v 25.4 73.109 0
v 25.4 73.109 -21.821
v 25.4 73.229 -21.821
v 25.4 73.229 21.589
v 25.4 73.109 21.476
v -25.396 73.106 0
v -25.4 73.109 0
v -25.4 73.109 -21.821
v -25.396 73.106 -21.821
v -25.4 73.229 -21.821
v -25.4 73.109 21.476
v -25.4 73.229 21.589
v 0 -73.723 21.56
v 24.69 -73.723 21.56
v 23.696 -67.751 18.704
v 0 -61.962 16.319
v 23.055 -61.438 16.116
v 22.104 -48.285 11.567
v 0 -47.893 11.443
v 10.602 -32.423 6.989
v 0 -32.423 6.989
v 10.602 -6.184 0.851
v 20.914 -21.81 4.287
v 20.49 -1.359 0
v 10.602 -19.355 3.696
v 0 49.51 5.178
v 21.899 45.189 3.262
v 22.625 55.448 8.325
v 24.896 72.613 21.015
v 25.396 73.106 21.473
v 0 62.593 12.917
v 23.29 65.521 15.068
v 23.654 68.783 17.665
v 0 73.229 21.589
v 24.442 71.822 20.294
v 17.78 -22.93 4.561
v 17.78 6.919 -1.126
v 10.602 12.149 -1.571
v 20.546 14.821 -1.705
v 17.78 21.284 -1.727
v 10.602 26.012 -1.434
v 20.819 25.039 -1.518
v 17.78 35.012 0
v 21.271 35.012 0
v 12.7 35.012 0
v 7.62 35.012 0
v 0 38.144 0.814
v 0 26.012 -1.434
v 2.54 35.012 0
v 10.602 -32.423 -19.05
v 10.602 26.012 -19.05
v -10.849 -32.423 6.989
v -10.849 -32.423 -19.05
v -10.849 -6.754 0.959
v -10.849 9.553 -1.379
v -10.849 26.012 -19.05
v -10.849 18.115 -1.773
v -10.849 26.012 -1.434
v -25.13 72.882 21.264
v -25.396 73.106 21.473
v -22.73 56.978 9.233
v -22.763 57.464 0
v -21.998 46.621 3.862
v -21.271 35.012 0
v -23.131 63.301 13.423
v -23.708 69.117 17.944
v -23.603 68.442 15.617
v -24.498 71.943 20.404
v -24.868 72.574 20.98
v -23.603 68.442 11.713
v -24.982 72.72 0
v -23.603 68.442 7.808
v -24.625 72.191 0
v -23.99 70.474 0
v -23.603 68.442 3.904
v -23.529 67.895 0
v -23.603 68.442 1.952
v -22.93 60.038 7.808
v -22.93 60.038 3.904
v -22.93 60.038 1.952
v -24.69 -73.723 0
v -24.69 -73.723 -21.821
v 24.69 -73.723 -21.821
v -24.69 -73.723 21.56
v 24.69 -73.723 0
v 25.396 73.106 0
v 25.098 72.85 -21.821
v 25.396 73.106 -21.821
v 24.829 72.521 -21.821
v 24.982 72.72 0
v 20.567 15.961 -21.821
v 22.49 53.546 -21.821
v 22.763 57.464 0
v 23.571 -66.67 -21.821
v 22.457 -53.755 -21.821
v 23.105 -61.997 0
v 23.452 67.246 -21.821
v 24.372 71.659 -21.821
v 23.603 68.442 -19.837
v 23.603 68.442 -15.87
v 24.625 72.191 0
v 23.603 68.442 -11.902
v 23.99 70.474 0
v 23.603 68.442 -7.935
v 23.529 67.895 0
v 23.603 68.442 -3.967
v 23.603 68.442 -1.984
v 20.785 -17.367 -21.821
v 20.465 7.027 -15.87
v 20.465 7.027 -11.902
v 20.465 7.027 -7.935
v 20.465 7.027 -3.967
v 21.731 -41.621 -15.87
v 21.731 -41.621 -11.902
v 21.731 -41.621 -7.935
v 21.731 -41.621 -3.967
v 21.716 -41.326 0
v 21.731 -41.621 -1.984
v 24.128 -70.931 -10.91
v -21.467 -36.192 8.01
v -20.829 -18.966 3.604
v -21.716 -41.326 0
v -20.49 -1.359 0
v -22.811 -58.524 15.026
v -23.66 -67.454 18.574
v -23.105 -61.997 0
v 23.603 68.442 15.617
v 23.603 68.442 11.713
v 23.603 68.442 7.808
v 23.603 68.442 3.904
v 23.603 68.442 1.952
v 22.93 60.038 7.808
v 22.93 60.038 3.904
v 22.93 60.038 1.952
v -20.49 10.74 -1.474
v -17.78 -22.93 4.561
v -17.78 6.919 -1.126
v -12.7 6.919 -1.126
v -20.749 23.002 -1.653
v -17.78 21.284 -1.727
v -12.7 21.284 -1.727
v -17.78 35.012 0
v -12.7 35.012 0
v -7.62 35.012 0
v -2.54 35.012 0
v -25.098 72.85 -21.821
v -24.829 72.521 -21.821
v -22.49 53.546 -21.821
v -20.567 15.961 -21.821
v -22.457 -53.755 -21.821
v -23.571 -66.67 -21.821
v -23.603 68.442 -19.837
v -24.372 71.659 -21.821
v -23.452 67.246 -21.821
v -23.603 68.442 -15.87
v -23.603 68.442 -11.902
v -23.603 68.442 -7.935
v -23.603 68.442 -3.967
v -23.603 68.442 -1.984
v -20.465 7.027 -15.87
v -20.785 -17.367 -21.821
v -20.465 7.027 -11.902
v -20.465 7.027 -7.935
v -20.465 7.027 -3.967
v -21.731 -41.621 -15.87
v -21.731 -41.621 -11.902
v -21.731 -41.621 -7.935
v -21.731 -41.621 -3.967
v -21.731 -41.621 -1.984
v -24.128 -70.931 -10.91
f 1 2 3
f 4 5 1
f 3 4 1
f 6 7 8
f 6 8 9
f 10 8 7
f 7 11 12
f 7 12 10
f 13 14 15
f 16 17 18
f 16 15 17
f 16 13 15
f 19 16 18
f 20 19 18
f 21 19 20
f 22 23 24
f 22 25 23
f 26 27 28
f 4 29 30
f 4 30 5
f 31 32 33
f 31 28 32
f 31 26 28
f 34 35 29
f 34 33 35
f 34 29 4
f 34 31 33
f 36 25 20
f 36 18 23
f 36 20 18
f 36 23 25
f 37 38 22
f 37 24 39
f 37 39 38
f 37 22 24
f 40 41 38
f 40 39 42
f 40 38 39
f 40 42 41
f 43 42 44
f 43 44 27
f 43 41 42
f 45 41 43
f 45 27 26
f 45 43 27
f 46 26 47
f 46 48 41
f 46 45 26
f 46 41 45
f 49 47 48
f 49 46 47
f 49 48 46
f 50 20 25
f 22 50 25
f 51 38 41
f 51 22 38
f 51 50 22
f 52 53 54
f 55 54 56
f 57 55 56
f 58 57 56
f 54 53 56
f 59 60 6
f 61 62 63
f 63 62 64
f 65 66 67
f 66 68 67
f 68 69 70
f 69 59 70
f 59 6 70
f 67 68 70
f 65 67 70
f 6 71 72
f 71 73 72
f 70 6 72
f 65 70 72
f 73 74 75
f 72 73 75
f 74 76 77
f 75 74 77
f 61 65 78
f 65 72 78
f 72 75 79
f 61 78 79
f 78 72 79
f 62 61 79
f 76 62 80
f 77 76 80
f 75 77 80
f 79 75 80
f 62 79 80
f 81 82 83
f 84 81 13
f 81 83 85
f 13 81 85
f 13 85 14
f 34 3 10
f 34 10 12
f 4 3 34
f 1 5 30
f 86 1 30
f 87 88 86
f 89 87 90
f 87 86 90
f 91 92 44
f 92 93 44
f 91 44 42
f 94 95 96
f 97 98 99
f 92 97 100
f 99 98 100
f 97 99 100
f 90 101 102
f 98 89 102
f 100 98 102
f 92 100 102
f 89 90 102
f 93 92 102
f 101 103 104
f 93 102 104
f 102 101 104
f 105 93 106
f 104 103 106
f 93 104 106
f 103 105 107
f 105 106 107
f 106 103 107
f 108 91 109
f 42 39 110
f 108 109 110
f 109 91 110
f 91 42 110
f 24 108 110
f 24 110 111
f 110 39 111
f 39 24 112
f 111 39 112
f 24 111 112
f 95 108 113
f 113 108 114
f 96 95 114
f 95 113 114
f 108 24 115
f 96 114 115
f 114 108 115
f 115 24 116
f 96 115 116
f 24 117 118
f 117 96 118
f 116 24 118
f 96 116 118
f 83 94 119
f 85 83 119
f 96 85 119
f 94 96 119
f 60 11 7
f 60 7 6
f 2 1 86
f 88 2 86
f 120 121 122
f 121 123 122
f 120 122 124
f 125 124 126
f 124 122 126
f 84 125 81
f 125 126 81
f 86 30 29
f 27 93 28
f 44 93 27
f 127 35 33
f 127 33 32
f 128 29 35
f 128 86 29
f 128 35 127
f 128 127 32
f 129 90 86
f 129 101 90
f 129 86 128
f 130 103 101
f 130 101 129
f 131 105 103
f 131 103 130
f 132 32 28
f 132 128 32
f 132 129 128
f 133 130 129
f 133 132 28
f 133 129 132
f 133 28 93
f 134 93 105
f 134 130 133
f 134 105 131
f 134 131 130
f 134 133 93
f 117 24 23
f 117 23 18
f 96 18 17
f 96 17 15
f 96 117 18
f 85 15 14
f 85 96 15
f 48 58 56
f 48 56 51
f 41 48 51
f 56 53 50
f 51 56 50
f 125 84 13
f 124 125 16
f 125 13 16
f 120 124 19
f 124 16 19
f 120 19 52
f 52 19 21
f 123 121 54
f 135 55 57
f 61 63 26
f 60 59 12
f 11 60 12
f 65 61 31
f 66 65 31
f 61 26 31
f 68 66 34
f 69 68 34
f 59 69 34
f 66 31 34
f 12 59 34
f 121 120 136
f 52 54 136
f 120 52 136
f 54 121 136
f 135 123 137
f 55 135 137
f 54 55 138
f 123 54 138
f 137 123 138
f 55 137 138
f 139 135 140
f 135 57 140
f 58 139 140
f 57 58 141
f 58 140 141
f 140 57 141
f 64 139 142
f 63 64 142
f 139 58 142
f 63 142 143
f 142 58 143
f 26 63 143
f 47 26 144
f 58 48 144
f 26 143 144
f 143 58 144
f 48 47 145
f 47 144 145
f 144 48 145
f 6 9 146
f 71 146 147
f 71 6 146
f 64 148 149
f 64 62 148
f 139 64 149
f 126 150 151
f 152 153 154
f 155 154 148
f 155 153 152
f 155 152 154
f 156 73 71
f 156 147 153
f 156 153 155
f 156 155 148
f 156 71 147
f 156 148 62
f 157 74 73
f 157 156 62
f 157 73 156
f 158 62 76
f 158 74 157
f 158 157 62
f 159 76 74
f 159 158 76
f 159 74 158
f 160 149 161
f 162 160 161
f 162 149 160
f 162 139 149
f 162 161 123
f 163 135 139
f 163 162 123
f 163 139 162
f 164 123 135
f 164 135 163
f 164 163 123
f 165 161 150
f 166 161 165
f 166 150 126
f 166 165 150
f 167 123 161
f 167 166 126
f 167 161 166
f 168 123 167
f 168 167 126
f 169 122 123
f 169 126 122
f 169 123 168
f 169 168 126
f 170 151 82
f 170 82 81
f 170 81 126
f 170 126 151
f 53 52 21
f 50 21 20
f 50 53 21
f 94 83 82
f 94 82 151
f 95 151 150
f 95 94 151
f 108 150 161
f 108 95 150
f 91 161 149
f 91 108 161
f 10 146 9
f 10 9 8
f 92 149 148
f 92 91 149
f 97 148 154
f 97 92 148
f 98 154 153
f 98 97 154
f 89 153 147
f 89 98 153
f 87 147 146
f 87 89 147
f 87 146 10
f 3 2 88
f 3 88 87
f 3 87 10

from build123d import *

# Parameters (mm, degrees)
F0_W          = 146.9521149993
F0_H          = 43.64182055
F1_DEPTH      = 25.4
F1_DEPTH_BACK = 25.4
F3_DEPTH      = 25.4
F3_DEPTH_BACK = 25.4
F5_DEPTH      = 25.4
F5_DEPTH_BACK = 25.4
F6_W          = 21.4510653168
F6_H          = 58.435657993
F7_DEPTH      = 19.05
F7_DEPTH_BACK = 19.05


with BuildPart() as f1:
    # F0 (on Right) → F1 (new body, two sides)
    with BuildSketch(Plane.YZ) as f1_sk:
        with Locations((-0.246565789, 0)):
            Rectangle(F0_W, F0_H)
    extrude(amount=F1_DEPTH)
    extrude(f1_sk.sketch, amount=-F1_DEPTH_BACK)

    # F2 (on Right) → F3 (cut, two sides)
    with BuildSketch(Plane.YZ) as f3_sk:
        with BuildLine():
            add(Edge.make_bspline(
                [(-74.215747416, 21.820910275), (-61.894191177, 15.2377273736), (-22.1100792082, 3.2237569893), (34.6803899351, -7.3993956262), (73.077793108, 19.258801403), (86.6447215634, 36.9009252345), (70.9789009852, 51.2328822131), (26.6385008912, 48.7207377435), (-29.9953971871, 46.1020839952), (-78.6939597066, 54.7034933177), (-90.3862941587, 33.3553993527), (-81.2800484867, 25.5952375691), (-74.215747416, 21.820910275)],
                knots=[0, 0, 0, 0, 0.1246967294, 0.2539314303, 0.3666593058, 0.4377567292, 0.5026378116, 0.6137286746, 0.7470863969, 0.8612680076, 0.9285077938, 1, 1, 1, 1], degree=3))
        make_face()
    extrude(amount=-F3_DEPTH, mode=Mode.SUBTRACT)
    extrude(f3_sk.sketch, amount=F3_DEPTH_BACK, mode=Mode.SUBTRACT)

    # F4 (on Top) → F5 (cut, two sides)
    with BuildSketch(Plane.XY) as f5_sk:
        with BuildLine():
            add(Edge.make_bspline(
                [(-25.3960862756, 73.1062069535), (-23.5095576316, 71.7872554287), (-22.9475698865, 55.4716414881), (-18.5812036149, 11.6112478816), (-22.9708888623, -73.9591128277), (-26.5923572766, -75.9397077273), (-60.6422517347, -78.6522113233), (-62.392178381, -20.1633902273), (-58.61908902, 44.1212419737), (-45.1288634077, 66.2260932479), (-40.7946206151, 73.8029194333), (-30.9643742623, 72.0170355029), (-26.6015743948, 73.949014402), (-25.3960862756, 73.1062069535)],
                knots=[0, 0, 0, 0, 0.0665799983, 0.1995830948, 0.3636325623, 0.3950919221, 0.4839306655, 0.6140422336, 0.7653117901, 0.854025013, 0.9022699385, 0.9574555111, 1, 1, 1, 1], degree=3))
        make_face()
        with BuildLine():
            add(Edge.make_bspline(
                [(25.3960862756, 73.1062069535), (23.5095576316, 71.7872554287), (22.9475698865, 55.4716414881), (18.5812036149, 11.6112478816), (22.9708888623, -73.9591128277), (26.5923572766, -75.9397077273), (60.6422517347, -78.6522113233), (62.392178381, -20.1633902273), (58.61908902, 44.1212419737), (45.1288634077, 66.2260932479), (40.7946206151, 73.8029194333), (30.9643742623, 72.0170355029), (26.6015743948, 73.949014402), (25.3960862756, 73.1062069535)],
                knots=[0, 0, 0, 0, 0.0665799983, 0.1995830948, 0.3636325623, 0.3950919221, 0.4839306655, 0.6140422336, 0.7653117901, 0.854025013, 0.9022699385, 0.9574555111, 1, 1, 1, 1], degree=3))
        make_face()
    extrude(amount=-F5_DEPTH, mode=Mode.SUBTRACT)
    extrude(f5_sk.sketch, amount=F5_DEPTH_BACK, mode=Mode.SUBTRACT)

    # F6 (on Top) → F7 (cut, two sides)
    with BuildSketch(Plane.XY) as f7_sk:
        with Locations((-0.1232819632, -3.2053319737)):
            Rectangle(F6_W, F6_H)
    extrude(amount=-F7_DEPTH, mode=Mode.SUBTRACT)
    extrude(f7_sk.sketch, amount=F7_DEPTH_BACK, mode=Mode.SUBTRACT)


solid = f1.part
